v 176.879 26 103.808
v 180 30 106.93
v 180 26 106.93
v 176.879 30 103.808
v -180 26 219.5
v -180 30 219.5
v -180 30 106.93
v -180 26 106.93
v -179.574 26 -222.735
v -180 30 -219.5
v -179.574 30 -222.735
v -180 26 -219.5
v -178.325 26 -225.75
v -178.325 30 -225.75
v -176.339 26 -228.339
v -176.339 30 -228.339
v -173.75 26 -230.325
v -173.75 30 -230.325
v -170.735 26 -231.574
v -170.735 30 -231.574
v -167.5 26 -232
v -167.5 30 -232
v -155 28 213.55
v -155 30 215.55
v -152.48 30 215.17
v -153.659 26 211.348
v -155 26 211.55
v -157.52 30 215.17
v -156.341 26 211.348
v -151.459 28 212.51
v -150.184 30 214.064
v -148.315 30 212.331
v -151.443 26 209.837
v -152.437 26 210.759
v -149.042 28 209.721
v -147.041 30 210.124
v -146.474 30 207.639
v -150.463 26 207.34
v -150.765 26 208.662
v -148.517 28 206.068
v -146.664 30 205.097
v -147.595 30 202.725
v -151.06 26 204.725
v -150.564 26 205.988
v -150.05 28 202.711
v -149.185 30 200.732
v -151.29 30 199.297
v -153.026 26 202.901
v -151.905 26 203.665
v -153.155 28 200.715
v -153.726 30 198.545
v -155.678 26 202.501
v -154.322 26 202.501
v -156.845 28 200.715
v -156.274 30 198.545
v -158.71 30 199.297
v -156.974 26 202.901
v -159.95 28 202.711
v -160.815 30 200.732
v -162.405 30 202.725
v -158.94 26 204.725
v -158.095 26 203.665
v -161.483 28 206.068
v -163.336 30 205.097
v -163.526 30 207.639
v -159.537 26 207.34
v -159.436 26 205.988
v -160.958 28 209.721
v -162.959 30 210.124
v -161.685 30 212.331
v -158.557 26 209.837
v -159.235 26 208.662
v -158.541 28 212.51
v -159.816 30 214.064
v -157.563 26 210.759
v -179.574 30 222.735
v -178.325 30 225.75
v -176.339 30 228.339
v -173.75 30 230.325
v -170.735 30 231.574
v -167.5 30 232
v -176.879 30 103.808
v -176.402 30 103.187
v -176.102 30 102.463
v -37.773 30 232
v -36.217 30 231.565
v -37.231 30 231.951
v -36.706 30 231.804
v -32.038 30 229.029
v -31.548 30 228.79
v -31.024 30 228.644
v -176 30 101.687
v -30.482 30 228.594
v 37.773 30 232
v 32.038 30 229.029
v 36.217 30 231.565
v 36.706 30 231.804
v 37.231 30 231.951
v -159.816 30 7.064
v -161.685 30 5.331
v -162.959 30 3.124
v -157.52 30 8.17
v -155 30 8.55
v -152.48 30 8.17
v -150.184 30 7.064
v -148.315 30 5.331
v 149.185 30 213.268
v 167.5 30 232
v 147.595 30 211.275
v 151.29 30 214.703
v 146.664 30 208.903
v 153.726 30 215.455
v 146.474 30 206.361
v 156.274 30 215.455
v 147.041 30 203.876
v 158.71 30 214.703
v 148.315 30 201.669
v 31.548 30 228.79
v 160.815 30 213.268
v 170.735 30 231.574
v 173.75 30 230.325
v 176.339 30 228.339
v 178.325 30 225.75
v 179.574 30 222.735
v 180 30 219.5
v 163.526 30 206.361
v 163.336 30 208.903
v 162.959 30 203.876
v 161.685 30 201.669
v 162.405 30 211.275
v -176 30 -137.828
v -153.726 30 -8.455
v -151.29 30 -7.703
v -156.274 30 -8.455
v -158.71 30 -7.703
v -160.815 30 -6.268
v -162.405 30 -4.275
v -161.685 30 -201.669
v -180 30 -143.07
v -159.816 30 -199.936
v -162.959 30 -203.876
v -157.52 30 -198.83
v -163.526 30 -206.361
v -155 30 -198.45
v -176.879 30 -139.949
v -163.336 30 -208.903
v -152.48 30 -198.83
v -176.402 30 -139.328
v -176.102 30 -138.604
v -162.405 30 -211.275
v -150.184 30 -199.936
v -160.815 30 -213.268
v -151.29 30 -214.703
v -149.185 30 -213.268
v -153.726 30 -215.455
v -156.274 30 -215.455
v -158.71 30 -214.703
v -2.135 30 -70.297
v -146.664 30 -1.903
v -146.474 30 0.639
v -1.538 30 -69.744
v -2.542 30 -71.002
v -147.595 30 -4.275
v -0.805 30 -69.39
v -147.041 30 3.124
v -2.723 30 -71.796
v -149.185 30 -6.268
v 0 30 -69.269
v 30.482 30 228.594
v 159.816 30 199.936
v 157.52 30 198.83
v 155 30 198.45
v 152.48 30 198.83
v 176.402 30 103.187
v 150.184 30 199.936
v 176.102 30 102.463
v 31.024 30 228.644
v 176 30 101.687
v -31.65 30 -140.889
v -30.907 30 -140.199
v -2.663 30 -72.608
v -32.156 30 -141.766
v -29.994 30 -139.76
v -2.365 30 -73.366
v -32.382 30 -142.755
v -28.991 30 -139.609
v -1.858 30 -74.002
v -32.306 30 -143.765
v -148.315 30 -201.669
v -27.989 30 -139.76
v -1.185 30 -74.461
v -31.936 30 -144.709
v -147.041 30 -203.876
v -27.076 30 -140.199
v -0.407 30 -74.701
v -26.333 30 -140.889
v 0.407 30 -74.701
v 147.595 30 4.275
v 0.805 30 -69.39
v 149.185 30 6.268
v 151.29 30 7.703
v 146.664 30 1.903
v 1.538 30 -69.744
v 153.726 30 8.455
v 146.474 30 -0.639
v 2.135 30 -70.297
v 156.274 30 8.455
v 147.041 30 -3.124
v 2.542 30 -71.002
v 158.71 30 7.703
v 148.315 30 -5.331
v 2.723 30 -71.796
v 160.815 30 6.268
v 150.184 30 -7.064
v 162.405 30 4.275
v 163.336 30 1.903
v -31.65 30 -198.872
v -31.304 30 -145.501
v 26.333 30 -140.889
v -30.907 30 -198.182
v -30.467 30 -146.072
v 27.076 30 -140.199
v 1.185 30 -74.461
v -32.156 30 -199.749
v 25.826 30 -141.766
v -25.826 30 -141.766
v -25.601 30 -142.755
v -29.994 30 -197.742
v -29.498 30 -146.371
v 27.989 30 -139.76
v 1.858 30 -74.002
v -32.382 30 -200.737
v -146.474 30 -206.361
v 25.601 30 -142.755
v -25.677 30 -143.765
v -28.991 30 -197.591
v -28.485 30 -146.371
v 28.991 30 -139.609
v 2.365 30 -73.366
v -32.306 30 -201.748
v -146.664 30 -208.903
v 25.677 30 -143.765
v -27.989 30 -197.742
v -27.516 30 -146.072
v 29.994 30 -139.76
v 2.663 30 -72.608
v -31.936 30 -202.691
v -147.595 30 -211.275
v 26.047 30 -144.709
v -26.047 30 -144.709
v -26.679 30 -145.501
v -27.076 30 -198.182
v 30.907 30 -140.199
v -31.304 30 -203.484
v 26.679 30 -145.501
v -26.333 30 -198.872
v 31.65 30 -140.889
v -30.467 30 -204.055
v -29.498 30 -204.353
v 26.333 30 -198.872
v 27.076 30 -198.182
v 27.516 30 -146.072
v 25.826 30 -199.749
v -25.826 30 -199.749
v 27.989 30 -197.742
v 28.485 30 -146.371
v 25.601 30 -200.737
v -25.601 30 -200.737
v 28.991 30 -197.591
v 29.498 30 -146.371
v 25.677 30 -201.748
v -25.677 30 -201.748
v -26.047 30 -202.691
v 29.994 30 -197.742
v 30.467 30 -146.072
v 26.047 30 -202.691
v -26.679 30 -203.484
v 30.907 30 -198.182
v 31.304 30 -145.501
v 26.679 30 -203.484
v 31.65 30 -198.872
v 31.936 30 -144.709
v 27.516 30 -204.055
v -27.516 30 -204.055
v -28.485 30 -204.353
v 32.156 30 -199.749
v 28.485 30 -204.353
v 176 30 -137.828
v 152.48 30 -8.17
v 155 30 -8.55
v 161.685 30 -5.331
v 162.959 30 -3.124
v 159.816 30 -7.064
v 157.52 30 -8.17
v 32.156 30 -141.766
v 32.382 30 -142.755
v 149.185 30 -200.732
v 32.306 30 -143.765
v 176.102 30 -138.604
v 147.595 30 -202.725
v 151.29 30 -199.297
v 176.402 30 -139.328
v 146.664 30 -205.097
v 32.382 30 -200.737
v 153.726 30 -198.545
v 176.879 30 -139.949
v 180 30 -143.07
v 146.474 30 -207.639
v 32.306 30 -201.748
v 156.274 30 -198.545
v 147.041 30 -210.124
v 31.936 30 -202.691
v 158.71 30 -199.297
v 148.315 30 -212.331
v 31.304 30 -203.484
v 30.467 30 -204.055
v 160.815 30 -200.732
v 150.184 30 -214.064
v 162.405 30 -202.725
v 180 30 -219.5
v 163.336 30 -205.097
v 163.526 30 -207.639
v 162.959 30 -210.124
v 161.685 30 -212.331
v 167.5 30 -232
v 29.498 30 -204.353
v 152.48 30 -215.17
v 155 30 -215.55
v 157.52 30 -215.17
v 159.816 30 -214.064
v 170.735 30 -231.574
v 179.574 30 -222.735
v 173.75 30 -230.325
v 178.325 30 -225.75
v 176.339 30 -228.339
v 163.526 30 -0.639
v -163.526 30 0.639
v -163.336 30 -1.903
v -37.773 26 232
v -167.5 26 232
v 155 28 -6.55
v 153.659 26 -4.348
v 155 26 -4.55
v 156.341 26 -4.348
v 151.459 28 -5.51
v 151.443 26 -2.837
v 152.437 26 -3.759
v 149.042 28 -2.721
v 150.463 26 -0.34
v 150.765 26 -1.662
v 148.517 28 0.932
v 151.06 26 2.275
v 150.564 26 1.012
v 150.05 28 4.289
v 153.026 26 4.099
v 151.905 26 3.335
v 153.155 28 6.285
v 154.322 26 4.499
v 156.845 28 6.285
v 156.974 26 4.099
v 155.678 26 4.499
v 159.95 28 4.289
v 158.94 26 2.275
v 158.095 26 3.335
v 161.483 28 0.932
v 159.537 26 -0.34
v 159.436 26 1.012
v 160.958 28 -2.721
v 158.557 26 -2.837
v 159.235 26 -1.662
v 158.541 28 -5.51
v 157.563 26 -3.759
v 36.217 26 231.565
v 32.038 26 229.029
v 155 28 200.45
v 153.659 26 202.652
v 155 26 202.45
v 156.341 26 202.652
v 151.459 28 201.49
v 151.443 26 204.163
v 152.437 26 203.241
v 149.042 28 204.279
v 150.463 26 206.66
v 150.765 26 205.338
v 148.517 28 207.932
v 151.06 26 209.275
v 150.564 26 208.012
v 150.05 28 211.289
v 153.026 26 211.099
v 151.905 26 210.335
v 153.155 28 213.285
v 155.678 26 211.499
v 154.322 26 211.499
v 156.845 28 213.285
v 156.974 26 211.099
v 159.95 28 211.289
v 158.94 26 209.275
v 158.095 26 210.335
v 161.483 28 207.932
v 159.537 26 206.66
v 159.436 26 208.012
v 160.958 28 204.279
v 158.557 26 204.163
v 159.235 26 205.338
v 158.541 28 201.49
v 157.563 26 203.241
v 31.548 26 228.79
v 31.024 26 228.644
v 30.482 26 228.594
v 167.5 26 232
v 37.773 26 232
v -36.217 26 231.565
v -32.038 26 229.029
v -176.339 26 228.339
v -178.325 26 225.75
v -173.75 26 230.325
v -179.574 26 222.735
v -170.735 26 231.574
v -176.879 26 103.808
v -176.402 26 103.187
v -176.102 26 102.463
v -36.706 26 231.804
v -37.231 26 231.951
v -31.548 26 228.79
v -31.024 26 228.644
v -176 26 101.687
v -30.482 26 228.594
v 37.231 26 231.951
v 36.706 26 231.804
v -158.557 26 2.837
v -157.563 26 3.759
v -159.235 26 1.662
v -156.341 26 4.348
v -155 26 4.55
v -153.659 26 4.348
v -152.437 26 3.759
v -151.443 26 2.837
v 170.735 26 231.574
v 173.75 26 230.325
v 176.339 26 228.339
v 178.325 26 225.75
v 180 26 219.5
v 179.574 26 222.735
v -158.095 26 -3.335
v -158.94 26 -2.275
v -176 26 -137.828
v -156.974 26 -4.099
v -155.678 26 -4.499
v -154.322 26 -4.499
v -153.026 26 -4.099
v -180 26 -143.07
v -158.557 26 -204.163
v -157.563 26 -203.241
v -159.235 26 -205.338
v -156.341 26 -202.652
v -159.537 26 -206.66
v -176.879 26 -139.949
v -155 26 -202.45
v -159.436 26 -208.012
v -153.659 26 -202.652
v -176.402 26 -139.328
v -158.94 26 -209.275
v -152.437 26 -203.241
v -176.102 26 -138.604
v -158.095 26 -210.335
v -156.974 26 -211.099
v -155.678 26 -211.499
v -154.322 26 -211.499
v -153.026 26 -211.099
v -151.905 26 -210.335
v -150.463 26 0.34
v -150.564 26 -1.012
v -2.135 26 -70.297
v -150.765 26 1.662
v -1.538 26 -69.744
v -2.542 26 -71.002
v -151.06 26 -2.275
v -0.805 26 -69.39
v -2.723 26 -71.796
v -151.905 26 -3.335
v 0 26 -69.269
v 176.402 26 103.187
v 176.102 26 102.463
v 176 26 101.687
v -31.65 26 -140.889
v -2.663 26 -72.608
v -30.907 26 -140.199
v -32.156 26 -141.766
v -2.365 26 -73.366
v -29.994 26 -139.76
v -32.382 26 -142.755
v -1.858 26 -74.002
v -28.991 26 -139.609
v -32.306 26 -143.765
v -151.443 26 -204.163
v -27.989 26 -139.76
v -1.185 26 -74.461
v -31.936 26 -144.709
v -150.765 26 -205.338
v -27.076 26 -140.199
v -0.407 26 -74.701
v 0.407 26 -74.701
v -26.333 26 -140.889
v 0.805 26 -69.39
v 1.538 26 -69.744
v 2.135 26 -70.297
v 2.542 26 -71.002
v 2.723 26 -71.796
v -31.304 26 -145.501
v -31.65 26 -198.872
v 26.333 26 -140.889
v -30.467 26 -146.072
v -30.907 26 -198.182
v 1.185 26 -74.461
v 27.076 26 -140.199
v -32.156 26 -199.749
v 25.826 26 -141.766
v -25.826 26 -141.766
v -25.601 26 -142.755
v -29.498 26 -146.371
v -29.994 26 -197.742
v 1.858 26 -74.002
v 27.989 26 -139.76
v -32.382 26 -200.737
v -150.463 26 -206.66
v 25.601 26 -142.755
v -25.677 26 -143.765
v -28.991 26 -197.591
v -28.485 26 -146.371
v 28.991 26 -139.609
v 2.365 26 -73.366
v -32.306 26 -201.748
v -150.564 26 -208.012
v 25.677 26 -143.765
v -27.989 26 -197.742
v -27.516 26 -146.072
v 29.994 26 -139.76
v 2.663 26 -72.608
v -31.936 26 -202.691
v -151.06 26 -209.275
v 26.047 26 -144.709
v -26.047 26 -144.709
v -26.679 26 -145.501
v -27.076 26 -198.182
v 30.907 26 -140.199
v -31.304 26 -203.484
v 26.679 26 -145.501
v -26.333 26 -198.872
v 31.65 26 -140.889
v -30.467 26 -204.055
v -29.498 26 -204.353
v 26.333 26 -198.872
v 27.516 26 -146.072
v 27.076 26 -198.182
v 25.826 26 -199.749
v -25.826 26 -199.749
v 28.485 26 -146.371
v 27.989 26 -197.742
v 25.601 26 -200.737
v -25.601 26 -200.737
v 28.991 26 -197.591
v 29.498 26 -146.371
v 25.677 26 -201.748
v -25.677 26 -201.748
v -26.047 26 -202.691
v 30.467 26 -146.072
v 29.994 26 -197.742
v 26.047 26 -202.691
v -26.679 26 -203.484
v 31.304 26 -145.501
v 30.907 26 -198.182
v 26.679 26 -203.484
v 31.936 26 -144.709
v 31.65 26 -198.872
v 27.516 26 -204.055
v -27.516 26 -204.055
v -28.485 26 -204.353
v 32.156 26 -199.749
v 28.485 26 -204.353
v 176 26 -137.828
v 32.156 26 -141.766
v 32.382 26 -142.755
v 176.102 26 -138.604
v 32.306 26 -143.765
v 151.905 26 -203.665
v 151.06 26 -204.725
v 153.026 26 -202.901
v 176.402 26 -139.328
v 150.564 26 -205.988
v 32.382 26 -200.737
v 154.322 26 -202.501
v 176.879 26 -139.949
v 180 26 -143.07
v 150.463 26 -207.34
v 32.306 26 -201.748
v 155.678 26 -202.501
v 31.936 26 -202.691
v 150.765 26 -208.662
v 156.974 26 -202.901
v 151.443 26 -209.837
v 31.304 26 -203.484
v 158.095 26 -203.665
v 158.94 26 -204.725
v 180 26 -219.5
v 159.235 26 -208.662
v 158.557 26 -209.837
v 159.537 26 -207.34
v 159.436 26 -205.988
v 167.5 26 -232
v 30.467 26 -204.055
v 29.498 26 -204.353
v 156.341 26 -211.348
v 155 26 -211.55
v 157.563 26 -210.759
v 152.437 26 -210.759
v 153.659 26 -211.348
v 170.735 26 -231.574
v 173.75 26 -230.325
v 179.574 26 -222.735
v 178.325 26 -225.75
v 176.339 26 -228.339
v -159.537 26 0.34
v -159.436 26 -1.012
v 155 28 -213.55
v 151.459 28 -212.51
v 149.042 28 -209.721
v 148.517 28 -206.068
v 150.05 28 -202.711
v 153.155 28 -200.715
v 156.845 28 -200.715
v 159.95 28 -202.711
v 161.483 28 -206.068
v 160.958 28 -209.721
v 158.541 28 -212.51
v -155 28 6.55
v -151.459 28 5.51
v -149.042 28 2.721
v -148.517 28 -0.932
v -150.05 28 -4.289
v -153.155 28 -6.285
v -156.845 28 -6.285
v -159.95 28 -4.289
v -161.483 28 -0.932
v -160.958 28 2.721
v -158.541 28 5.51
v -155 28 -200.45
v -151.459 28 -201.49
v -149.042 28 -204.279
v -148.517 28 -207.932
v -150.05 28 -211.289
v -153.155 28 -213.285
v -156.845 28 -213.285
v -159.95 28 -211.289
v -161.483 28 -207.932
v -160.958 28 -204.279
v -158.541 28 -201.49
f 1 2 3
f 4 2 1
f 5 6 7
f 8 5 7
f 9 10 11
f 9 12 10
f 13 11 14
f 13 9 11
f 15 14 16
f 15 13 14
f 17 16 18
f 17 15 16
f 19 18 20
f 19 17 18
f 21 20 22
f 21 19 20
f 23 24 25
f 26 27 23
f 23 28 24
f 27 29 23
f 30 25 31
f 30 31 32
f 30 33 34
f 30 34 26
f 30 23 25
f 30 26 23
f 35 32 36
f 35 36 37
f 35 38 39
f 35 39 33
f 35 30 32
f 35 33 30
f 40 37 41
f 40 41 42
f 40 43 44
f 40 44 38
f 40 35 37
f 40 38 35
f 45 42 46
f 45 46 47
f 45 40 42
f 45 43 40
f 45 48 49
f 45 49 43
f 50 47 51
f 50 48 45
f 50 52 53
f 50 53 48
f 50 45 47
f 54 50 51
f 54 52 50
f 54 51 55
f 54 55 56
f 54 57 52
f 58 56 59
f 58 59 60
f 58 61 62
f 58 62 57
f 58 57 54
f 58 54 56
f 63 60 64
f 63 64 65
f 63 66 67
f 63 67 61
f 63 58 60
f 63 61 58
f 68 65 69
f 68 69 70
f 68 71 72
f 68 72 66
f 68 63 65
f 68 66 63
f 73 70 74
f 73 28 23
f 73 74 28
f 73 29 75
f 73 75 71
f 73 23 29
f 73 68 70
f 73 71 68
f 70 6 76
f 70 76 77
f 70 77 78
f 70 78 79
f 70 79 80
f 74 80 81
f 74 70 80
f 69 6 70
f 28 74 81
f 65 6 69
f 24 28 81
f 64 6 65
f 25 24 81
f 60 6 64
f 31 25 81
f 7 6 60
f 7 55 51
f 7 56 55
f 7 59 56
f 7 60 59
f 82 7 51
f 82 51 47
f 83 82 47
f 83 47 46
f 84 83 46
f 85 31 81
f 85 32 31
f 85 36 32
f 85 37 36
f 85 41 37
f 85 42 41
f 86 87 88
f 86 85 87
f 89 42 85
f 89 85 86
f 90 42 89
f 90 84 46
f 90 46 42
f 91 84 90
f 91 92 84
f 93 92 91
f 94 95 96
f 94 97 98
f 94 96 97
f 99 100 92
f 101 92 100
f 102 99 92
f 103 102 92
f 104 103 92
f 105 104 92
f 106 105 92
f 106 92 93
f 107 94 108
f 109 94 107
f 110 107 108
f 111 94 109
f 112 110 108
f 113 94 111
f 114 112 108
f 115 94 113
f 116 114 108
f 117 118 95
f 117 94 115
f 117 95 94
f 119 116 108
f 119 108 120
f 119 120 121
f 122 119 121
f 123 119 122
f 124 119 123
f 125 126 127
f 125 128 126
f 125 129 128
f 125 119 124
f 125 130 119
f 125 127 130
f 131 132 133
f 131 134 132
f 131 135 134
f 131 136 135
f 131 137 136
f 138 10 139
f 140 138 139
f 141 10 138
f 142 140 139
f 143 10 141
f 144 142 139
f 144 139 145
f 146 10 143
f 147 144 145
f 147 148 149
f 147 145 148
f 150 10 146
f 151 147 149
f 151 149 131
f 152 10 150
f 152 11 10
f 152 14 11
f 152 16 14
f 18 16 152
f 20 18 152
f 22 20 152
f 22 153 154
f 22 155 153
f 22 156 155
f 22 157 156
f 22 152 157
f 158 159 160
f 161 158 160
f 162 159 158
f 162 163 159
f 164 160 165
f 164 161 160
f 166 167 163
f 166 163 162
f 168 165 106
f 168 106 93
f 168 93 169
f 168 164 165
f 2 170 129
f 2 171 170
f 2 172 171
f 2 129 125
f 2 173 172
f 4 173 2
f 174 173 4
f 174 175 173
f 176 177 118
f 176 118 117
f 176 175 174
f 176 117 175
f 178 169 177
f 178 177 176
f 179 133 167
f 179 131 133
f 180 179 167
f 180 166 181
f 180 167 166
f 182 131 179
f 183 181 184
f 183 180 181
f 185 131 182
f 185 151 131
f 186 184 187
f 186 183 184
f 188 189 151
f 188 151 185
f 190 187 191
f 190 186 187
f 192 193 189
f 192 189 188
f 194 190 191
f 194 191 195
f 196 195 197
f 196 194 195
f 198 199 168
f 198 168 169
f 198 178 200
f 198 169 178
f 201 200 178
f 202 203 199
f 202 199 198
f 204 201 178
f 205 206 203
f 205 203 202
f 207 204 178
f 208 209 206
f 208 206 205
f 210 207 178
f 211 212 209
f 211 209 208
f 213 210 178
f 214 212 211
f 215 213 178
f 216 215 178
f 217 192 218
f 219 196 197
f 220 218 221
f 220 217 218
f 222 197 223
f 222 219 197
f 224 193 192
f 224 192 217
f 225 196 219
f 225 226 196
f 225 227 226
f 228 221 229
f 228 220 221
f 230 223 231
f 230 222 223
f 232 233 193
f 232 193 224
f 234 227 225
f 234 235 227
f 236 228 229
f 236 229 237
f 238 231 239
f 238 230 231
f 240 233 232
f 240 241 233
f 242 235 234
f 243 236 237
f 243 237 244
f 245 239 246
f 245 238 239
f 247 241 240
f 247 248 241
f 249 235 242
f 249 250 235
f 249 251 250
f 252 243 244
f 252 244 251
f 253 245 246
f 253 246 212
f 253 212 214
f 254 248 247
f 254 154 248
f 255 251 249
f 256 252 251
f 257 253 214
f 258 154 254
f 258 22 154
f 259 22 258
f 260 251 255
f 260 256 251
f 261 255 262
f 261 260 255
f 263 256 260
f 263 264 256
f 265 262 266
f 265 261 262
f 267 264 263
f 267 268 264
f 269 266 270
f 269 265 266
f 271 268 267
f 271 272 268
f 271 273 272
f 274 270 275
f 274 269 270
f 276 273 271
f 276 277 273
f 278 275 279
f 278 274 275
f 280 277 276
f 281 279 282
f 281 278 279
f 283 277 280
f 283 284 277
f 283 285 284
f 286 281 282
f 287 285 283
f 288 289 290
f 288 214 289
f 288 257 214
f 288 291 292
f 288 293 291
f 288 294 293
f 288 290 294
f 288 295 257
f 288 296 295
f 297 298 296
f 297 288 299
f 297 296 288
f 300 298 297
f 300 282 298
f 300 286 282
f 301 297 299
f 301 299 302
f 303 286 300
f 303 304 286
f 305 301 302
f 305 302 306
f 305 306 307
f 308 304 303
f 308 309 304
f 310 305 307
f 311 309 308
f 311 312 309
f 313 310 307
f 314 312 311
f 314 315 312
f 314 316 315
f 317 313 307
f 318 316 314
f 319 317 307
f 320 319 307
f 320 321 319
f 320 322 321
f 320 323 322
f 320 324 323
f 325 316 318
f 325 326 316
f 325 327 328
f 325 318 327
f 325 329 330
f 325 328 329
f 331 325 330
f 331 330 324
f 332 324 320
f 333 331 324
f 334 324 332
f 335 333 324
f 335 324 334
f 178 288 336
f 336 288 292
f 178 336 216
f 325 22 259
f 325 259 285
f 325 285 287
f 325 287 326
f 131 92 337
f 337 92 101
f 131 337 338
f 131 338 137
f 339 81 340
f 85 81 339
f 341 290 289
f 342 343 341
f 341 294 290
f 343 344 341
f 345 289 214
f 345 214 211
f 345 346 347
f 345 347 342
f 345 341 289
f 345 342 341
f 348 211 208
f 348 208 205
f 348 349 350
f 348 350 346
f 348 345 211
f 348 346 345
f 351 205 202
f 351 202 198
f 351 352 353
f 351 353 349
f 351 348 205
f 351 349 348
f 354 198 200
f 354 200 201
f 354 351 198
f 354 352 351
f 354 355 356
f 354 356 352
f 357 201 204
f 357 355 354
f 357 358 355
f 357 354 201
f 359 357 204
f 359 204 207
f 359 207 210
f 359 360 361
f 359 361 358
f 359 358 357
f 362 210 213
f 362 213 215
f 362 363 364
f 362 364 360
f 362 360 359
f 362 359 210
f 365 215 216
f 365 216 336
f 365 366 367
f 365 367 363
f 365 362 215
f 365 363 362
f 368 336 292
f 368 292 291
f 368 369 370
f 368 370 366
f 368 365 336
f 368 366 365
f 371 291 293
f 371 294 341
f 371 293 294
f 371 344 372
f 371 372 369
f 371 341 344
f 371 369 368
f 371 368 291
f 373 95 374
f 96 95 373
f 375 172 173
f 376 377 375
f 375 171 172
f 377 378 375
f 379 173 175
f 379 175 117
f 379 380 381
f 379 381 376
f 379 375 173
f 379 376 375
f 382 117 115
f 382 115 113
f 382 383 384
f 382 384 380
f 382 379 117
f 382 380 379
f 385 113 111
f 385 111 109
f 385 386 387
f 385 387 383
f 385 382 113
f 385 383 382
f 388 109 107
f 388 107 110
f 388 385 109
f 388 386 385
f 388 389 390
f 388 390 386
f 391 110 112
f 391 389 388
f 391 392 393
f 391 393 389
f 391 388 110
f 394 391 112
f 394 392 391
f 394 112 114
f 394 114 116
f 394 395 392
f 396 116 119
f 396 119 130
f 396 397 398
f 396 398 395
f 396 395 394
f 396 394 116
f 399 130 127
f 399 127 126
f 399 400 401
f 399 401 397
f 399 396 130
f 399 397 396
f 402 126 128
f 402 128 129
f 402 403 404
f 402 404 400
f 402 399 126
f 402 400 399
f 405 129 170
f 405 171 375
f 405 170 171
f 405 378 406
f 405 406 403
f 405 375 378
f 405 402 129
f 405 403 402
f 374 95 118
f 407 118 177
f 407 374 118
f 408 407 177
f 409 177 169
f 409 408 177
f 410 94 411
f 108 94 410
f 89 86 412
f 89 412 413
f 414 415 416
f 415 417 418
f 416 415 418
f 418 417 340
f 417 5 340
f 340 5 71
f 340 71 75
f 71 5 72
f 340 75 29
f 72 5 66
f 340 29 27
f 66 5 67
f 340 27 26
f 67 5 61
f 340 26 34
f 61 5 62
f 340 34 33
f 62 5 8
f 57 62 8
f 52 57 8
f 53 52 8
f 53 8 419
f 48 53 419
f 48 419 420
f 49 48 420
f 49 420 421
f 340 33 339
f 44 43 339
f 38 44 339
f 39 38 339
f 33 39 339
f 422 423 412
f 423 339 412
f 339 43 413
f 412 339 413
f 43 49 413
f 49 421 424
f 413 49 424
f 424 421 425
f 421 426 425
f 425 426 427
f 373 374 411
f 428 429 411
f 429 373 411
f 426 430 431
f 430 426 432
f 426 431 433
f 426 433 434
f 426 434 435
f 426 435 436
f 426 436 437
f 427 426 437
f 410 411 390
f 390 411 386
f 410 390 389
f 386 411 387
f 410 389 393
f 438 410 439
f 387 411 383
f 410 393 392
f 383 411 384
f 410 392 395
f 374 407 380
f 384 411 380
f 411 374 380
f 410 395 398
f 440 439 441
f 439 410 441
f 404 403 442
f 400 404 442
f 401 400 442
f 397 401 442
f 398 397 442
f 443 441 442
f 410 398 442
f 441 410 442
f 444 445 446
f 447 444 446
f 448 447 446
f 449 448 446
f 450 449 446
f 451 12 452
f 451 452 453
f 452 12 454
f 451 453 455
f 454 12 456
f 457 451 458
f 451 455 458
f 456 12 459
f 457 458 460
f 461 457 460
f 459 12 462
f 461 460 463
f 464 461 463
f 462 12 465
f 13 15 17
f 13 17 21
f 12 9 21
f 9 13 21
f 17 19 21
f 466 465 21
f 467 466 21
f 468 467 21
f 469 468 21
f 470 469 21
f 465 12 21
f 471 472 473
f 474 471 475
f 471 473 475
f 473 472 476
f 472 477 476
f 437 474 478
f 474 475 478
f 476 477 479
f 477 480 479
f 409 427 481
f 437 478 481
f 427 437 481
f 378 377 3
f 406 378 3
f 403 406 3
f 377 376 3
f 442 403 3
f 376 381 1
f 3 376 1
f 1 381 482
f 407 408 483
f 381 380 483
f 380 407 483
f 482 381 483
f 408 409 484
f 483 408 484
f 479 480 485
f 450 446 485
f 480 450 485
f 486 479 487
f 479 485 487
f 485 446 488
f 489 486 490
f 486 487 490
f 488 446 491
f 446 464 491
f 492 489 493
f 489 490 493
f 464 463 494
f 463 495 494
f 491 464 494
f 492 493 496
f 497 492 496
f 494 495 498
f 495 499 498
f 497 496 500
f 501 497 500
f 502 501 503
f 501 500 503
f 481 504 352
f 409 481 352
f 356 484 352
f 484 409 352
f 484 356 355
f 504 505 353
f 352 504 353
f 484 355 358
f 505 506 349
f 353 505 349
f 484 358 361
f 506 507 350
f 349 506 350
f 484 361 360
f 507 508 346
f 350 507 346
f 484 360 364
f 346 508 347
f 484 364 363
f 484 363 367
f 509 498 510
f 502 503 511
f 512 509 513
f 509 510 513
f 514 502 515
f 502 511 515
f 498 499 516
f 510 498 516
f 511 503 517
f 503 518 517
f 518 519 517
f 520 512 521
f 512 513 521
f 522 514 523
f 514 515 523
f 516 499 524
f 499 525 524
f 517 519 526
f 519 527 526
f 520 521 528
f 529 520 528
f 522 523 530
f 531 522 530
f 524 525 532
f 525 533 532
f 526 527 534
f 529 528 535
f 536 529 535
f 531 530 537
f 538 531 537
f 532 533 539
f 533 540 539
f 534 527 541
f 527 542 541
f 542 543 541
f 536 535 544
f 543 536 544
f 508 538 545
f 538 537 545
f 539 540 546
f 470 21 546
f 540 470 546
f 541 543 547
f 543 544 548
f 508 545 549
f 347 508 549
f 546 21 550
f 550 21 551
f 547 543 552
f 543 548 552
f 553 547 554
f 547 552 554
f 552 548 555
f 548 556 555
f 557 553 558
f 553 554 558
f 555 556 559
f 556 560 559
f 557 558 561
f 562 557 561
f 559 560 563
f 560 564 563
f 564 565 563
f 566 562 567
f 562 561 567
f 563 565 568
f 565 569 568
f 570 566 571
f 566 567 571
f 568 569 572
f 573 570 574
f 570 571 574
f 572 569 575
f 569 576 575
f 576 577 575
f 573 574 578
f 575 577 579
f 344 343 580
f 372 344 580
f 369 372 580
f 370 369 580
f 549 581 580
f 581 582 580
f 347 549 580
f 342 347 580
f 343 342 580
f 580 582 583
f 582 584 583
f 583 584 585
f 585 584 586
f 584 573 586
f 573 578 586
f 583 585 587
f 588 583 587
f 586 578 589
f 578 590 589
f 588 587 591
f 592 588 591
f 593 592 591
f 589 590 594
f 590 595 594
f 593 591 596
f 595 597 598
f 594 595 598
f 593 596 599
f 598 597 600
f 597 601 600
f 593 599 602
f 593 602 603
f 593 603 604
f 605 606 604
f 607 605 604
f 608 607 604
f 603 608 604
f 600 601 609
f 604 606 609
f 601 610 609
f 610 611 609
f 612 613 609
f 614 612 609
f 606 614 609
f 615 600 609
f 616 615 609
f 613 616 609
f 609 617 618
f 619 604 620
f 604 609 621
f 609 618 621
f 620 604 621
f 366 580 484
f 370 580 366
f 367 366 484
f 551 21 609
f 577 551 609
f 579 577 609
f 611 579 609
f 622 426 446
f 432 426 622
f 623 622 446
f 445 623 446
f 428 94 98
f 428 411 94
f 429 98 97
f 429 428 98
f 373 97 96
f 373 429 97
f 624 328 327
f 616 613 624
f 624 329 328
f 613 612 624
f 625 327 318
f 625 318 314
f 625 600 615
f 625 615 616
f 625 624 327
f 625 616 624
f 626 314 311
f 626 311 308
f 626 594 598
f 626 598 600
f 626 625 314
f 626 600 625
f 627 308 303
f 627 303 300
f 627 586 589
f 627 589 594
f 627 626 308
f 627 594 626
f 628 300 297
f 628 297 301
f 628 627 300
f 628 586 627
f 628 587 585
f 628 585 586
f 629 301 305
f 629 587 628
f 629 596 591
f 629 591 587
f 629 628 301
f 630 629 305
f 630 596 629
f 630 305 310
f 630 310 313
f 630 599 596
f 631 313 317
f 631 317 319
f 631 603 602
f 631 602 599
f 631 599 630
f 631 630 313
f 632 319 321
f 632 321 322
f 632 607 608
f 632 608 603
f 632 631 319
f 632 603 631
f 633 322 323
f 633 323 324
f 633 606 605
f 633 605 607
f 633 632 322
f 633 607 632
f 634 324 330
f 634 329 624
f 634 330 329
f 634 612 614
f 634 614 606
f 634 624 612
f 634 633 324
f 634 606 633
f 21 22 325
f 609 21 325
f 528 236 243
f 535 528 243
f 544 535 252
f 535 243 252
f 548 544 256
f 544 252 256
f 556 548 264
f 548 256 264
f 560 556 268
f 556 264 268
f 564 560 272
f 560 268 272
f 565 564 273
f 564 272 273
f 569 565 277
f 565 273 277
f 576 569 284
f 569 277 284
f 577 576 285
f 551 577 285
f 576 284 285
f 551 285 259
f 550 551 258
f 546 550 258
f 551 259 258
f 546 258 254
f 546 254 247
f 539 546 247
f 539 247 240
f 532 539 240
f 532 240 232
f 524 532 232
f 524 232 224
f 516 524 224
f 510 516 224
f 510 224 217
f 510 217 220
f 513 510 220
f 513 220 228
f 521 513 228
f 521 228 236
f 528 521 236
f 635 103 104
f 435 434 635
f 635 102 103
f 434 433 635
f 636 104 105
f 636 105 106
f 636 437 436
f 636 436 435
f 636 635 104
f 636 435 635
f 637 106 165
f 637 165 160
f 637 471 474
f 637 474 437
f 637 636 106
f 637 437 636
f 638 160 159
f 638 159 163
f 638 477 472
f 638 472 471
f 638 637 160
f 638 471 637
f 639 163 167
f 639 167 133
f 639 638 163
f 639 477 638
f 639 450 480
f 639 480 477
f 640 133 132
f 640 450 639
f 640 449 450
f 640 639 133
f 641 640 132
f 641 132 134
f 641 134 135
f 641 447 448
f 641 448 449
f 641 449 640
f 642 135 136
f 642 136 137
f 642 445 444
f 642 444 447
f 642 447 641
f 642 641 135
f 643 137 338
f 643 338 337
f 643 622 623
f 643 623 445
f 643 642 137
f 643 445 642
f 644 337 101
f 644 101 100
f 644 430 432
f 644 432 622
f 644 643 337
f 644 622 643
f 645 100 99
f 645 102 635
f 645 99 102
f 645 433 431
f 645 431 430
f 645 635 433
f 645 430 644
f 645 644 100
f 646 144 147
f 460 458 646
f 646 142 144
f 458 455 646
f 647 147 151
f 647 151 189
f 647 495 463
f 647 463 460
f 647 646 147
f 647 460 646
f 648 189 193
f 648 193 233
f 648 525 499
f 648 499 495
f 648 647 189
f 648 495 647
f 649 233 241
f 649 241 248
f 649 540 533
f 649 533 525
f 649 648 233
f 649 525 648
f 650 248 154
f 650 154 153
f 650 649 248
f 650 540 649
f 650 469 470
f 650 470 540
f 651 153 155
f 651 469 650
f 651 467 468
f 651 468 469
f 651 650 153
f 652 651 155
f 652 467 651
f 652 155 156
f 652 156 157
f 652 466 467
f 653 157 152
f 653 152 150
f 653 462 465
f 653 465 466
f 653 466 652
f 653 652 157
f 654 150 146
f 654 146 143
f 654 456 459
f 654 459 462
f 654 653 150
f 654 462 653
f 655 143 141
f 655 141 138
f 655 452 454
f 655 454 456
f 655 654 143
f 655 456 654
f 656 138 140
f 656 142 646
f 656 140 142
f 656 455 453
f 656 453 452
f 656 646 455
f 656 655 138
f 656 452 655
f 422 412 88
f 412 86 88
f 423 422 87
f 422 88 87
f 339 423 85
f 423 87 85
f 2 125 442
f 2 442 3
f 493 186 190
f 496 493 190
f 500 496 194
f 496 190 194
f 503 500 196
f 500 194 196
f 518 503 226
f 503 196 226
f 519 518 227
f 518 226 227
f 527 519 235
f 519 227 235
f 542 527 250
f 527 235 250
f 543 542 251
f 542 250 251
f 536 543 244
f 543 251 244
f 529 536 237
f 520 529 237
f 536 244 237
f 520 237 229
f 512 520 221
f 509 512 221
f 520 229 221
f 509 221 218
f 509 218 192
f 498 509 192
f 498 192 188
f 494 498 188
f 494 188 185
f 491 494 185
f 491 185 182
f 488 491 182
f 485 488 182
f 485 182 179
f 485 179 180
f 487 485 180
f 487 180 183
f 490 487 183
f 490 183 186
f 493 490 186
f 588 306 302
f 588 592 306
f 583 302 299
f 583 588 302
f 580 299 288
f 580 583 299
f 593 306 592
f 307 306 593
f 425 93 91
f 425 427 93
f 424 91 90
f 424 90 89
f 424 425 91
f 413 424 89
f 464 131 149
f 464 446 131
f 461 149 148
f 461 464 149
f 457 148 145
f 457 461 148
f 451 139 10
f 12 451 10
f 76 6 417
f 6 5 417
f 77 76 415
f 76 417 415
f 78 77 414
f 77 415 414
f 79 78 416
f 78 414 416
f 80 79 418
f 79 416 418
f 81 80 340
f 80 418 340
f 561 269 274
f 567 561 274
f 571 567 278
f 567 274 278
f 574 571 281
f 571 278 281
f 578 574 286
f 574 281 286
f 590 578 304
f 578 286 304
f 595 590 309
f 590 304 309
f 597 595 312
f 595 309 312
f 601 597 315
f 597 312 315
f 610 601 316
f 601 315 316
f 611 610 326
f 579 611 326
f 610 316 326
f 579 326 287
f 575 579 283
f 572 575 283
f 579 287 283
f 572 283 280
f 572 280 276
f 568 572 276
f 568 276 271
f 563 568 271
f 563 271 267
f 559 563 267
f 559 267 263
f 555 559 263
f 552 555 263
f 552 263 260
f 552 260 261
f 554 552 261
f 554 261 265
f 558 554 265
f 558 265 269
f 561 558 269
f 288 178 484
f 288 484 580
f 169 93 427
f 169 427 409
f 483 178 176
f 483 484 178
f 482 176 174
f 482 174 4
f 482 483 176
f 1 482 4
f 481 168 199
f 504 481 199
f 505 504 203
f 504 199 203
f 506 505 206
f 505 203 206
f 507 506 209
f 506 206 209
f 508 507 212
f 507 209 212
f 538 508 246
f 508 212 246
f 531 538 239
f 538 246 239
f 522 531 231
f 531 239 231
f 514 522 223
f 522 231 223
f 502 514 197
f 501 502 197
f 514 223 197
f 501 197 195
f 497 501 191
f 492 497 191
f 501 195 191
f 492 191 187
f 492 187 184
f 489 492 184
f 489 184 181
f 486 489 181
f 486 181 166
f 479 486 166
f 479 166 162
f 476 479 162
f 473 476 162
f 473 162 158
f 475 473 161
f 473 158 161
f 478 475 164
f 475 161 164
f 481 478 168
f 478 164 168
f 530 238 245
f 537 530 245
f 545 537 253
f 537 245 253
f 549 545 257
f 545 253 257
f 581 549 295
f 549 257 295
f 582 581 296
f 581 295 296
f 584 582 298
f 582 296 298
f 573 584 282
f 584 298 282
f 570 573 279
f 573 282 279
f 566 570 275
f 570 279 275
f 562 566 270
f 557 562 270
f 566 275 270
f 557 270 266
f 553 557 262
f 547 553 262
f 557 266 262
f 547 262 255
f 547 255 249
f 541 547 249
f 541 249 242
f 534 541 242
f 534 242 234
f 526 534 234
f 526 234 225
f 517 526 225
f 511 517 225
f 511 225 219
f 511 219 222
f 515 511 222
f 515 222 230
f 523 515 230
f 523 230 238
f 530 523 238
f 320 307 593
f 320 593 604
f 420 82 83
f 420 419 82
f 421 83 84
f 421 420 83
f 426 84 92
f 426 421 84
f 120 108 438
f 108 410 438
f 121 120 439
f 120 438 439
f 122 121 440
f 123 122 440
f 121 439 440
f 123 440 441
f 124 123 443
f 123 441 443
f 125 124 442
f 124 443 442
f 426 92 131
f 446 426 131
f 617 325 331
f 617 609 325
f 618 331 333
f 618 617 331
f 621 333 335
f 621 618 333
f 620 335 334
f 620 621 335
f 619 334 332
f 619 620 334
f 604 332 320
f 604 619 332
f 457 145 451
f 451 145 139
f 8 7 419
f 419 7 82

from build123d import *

# Parameters (mm, degrees)
SKETCH1_W           = 360
SKETCH1_H           = 464
SKETCH1_R           = 3.4
SKETCH1_R_2         = 2.731026391
BOSS_EXTRUDE1_DEPTH = 4
FILLET1_R           = 12.5
SKETCH5_R           = 3.4
CUT_EXTRUDE4_DEPTH  = 20
CUT_EXTRUDE5_DEPTH  = 10
CUT_EXTRUDE6_DEPTH  = 10
FILLET2_R           = 3
CHAMFER1_SIZE       = 5.15


with BuildPart() as part:
    # Sketch1 → Boss-Extrude1 (new body)
    with BuildSketch(Plane(origin=(0, 30, 0), x_dir=(1, 0, 0), z_dir=(0, 1, 0))):
        Rectangle(SKETCH1_W, SKETCH1_H)
        with Locations(Location((-155, 207, 0), (0, 0, 270))):
            Circle(SKETCH1_R, mode=Mode.SUBTRACT)
        with Locations(Location((155, 207, 0), (0, 0, 90))):
            Circle(SKETCH1_R, mode=Mode.SUBTRACT)
        with Locations(Location((-155, -207, 0), (0, 0, 270))):
            Circle(SKETCH1_R, mode=Mode.SUBTRACT)
        with Locations(Location((155, -207, 0), (0, 0, 90))):
            Circle(SKETCH1_R, mode=Mode.SUBTRACT)
        with Locations(Location((-155, 0, 0), (0, 0, 270))):
            Circle(SKETCH1_R, mode=Mode.SUBTRACT)
        with Locations(Location((155, 0, 0), (0, 0, 90))):
            Circle(SKETCH1_R, mode=Mode.SUBTRACT)
        with Locations(Location((0, 72, 0), (0, 0, 270))):
            Circle(SKETCH1_R_2, mode=Mode.SUBTRACT)
    extrude(amount=-BOSS_EXTRUDE1_DEPTH)

    # Fillet1
    fillet1_edges = [part.edges().sort_by_distance(p)[0] for p in [
        (180, 28, -232),
        (180, 28, 232),
        (-180, 28, 232),
        (-180, 28, -232),
    ]]
    fillet(fillet1_edges, radius=FILLET1_R)

    # Sketch5 → Cut-Extrude4 (cut)
    with BuildSketch(Plane(origin=(0, 40, 377.333920735), x_dir=(0, 0, 1), z_dir=(0, 1, 0))):
        with Locations((-520.342542706, 28.991378029)):
            Circle(SKETCH5_R)
        with Locations((-520.342542706, -28.991378029)):
            Circle(SKETCH5_R)
        with Locations((-578.325298763, -28.991378029)):
            Circle(SKETCH5_R)
        with Locations((-578.325298763, 28.991378029)):
            Circle(SKETCH5_R)
    extrude(amount=-CUT_EXTRUDE4_DEPTH, mode=Mode.SUBTRACT)

    # Sketch6 → Cut-Extrude5 (cut)
    with BuildSketch(Plane(origin=(0, 30, 0), x_dir=(1, 0, 0), z_dir=(0, 1, 0))):
        Polygon((-176, -102.929588377), (-176, 139.070411623), (-188.727922061, 151.798333685), (-188.727922061, -115.657510438), align=None)
    cut_extrude5 = extrude(amount=-CUT_EXTRUDE5_DEPTH, mode=Mode.SUBTRACT)

    # Sketch7 → Cut-Extrude6 (cut)
    with BuildSketch(Plane(origin=(0, 30, 0), x_dir=(1, 0, 0), z_dir=(0, 1, 0))):
        Polygon((-31.320564901, -228.594250629), (31.320564901, -228.594250629), (45, -236.893229805), (-45, -236.893229805), align=None)
    extrude(amount=-CUT_EXTRUDE6_DEPTH, mode=Mode.SUBTRACT)

    # Mirror2: Cut-Extrude5 across plane
    add(cut_extrude5.mirror(Plane(origin=(0, 0, 0), x_dir=(0, 0, 1), z_dir=(1, 0, 0))), mode=Mode.SUBTRACT)

    # Fillet2
    fillet2_edges = [part.edges().sort_by_distance(p)[0] for p in [
        (36.934355042, 28, 232),
        (-36.934355042, 28, 232),
        (-31.320564901, 28, 228.594250629),
        (31.320564901, 28, 228.594250629),
        (176, 28, 102.929588377),
        (176, 28, -139.070411623),
        (-176, 28, -139.070411623),
        (-176, 28, 102.929588377),
    ]]
    fillet(fillet2_edges, radius=FILLET2_R)

    # Chamfer1
    # the kernel refuses this chamfer: 5.15 mm, written as the material it takes off along each edge
    with BuildSketch(Plane(origin=(-155, 30, -207), x_dir=(0, 0, 1), z_dir=(-1, 0, 0))) as chamfer1_piece_1:
        Polygon((3.4 + CHAMFER1_SIZE, 0), (3.4, -CHAMFER1_SIZE), (3.4, 0), align=None)
    revolve(axis=Axis((-155, 30, -207), (0, 1, 0)), mode=Mode.SUBTRACT)
    with BuildSketch(Plane(origin=(155, 30, 207), x_dir=(0, 0, -1), z_dir=(1, 0, 0))) as chamfer1_piece_2:
        Polygon((3.4 + CHAMFER1_SIZE, 0), (3.4, -CHAMFER1_SIZE), (3.4, 0), align=None)
    revolve(axis=Axis((155, 30, 207), (0, 1, 0)), mode=Mode.SUBTRACT)
    with BuildSketch(Plane(origin=(155, 30, 0), x_dir=(0, 0, -1), z_dir=(1, 0, 0))) as chamfer1_piece_3:
        Polygon((3.4 + CHAMFER1_SIZE, 0), (3.4, -CHAMFER1_SIZE), (3.4, 0), align=None)
    revolve(axis=Axis((155, 30, 0), (0, 1, 0)), mode=Mode.SUBTRACT)
    with BuildSketch(Plane(origin=(-155, 30, 207), x_dir=(0, 0, 1), z_dir=(-1, 0, 0))) as chamfer1_piece_4:
        Polygon((3.4 + CHAMFER1_SIZE, 0), (3.4, -CHAMFER1_SIZE), (3.4, 0), align=None)
    revolve(axis=Axis((-155, 30, 207), (0, 1, 0)), mode=Mode.SUBTRACT)
    with BuildSketch(Plane(origin=(-155, 30, 0), x_dir=(0, 0, 1), z_dir=(-1, 0, 0))) as chamfer1_piece_5:
        Polygon((3.4 + CHAMFER1_SIZE, 0), (3.4, -CHAMFER1_SIZE), (3.4, 0), align=None)
    revolve(axis=Axis((-155, 30, 0), (0, 1, 0)), mode=Mode.SUBTRACT)
    with BuildSketch(Plane(origin=(155, 30, -207), x_dir=(0, 0, -1), z_dir=(1, 0, 0))) as chamfer1_piece_6:
        Polygon((3.4 + CHAMFER1_SIZE, 0), (3.4, -CHAMFER1_SIZE), (3.4, 0), align=None)
    revolve(axis=Axis((155, 30, -207), (0, 1, 0)), mode=Mode.SUBTRACT)


solid = part.part
